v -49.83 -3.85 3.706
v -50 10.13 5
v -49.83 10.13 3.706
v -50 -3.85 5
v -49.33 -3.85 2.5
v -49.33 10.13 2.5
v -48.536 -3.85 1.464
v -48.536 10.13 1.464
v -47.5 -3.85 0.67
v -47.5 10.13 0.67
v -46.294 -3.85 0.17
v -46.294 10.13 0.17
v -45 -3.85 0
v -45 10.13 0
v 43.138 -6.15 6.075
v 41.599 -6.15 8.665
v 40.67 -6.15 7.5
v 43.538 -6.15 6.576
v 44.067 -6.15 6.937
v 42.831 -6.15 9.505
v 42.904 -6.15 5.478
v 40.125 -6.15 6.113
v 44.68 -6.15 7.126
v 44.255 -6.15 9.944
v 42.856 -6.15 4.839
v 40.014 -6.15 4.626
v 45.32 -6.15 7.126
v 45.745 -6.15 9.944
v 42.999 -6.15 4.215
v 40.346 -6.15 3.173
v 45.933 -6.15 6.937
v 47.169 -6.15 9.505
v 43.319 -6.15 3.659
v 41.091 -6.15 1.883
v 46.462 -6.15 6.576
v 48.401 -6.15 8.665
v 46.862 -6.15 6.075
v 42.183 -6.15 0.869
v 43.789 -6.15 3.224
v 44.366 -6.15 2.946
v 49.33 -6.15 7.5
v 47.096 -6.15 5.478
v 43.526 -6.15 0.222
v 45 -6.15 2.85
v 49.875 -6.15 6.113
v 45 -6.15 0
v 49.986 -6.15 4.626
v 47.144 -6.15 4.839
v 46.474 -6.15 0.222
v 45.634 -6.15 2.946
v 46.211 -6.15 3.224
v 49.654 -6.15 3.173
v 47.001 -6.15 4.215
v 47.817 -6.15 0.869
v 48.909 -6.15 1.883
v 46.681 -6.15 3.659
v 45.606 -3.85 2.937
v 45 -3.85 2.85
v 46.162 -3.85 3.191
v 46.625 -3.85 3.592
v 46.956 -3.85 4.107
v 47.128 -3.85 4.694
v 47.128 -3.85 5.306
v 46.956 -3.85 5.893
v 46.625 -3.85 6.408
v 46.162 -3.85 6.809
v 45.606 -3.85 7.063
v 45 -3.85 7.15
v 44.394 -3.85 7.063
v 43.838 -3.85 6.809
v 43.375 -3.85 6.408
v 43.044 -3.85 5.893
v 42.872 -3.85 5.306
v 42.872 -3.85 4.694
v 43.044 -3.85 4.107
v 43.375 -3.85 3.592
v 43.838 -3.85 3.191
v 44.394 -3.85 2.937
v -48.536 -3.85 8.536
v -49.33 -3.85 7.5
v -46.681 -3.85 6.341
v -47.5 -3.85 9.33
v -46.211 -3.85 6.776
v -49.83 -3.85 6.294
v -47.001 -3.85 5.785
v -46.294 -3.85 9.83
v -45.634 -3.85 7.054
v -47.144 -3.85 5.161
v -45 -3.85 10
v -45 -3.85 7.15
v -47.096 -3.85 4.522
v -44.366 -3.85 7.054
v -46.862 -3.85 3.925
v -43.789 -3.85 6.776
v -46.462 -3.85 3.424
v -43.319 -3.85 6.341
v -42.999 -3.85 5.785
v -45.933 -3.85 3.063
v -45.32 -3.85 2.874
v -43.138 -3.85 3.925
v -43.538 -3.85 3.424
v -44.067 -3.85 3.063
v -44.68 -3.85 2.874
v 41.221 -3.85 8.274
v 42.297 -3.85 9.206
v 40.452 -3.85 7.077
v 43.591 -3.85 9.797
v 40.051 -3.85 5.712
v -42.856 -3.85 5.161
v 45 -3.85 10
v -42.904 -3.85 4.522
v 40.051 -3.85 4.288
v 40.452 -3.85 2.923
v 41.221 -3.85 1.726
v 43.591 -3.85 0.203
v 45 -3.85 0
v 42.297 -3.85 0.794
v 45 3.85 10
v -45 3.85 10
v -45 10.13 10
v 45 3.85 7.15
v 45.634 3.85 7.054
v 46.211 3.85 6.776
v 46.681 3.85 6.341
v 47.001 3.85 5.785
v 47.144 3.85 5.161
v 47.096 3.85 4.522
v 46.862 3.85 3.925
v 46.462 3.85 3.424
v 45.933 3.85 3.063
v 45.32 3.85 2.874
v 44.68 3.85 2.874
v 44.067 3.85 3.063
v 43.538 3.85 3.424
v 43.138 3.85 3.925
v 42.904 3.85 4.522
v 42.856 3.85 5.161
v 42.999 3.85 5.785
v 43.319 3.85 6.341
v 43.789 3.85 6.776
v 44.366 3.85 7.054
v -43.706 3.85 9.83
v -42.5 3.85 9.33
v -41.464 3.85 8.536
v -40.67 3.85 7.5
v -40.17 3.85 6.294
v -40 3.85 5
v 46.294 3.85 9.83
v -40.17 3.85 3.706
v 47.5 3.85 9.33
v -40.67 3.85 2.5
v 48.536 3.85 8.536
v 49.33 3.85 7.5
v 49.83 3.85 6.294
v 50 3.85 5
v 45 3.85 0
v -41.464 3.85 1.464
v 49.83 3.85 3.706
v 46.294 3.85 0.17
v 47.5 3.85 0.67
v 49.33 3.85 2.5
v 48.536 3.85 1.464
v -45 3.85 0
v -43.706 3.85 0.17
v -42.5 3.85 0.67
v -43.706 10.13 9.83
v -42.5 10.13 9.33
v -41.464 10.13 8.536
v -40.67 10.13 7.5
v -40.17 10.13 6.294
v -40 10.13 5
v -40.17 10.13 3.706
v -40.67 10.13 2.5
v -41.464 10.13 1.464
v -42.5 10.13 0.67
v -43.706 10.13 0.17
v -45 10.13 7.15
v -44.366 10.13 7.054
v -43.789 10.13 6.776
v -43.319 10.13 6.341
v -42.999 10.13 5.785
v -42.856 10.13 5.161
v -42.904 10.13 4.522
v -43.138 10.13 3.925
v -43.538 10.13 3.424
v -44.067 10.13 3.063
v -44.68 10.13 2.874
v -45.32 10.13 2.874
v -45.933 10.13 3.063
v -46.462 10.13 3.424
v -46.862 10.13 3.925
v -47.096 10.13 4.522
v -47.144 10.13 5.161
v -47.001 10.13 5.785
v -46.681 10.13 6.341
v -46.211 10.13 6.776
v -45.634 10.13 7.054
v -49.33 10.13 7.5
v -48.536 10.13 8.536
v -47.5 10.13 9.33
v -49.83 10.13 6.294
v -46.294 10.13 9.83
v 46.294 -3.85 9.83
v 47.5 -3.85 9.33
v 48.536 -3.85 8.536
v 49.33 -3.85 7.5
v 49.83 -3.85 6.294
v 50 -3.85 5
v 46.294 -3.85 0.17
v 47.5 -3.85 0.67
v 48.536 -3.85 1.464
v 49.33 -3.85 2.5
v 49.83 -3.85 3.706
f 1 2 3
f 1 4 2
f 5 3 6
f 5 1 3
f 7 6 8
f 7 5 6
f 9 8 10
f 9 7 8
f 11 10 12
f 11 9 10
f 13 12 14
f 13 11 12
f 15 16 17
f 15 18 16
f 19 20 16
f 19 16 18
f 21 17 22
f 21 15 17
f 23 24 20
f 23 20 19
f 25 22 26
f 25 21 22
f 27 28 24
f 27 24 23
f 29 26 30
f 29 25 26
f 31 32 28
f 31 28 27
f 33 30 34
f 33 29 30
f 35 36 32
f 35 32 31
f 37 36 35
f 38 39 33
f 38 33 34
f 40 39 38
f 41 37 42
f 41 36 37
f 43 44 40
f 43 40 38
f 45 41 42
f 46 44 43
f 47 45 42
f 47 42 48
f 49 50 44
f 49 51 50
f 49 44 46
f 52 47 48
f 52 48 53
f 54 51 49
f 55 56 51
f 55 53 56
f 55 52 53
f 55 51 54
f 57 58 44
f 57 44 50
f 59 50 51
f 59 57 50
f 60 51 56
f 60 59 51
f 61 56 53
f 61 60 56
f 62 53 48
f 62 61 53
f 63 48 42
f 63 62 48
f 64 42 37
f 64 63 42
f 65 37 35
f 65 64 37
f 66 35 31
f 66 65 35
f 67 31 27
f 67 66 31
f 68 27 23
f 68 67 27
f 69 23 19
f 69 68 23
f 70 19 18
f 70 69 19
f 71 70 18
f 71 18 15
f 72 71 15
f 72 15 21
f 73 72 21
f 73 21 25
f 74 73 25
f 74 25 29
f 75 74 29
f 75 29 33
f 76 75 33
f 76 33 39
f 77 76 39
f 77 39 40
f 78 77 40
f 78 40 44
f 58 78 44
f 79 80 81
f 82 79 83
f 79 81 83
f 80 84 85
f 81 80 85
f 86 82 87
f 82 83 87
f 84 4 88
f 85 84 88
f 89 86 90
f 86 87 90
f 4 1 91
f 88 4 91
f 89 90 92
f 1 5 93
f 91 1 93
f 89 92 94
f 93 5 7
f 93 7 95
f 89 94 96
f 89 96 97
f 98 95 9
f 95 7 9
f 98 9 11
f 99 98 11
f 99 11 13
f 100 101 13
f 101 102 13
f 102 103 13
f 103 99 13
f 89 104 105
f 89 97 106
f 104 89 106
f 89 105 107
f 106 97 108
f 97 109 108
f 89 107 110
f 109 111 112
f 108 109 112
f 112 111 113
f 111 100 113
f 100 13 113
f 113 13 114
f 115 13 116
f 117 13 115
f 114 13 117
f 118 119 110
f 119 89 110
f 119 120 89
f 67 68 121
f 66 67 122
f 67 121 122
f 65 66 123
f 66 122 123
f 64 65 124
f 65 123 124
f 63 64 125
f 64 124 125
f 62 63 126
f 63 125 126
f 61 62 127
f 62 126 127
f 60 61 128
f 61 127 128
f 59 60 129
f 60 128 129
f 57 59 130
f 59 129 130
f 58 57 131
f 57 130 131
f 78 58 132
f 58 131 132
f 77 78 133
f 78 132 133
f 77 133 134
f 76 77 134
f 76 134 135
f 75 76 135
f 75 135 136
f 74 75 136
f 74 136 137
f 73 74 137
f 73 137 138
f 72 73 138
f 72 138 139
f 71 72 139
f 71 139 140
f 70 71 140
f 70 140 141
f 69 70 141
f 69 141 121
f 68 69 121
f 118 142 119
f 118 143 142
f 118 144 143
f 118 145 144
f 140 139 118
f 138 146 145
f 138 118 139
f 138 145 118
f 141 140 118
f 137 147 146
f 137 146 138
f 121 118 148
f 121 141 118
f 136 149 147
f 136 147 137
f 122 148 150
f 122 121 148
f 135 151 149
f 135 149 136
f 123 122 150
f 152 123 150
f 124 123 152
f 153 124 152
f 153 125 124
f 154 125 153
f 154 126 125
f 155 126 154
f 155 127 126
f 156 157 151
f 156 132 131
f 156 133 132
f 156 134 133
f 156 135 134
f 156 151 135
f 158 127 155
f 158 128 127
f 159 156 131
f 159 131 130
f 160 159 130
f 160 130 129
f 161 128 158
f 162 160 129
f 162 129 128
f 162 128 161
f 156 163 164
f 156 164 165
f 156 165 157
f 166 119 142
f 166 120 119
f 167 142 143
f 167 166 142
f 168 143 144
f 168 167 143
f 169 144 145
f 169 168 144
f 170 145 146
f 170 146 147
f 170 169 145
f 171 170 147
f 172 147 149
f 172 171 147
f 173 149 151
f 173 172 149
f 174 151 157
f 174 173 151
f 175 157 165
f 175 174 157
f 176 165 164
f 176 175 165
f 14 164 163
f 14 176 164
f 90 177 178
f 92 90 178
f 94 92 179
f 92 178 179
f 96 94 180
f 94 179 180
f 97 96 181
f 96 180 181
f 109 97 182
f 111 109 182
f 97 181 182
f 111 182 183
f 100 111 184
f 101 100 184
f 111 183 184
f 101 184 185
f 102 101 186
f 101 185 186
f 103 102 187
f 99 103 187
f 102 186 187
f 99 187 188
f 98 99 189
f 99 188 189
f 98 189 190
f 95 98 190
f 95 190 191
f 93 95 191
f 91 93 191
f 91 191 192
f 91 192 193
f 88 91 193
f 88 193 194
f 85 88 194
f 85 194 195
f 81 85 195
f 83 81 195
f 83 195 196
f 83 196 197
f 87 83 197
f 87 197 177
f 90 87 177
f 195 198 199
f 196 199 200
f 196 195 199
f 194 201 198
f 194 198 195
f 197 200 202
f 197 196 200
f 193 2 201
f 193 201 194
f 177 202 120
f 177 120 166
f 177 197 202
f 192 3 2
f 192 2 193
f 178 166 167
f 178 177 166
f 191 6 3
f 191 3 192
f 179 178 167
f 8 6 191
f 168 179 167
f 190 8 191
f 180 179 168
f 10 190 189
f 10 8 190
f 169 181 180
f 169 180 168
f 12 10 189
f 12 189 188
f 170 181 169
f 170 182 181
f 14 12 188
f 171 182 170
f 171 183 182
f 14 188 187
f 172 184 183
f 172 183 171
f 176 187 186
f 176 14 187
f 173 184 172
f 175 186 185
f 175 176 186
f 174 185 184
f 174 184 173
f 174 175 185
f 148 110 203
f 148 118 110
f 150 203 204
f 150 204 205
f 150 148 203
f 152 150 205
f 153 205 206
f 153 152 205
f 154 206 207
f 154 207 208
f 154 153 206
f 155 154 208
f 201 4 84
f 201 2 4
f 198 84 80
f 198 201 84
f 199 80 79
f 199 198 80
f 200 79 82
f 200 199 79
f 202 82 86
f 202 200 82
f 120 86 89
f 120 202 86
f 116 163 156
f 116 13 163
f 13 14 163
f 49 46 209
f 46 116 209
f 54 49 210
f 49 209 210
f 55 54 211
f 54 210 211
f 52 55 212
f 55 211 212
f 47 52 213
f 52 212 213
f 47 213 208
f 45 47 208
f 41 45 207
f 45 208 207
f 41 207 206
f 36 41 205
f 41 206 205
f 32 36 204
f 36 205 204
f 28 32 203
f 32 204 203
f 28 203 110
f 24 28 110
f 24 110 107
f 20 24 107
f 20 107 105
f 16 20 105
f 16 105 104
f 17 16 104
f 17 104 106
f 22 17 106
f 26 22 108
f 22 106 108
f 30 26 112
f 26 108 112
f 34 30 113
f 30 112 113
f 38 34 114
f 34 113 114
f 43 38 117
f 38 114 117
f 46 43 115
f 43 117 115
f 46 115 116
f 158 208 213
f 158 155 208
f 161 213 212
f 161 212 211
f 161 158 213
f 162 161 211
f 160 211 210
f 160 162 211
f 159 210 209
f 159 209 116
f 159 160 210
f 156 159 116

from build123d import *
from build123d.topology import SkipClean

# Parameters (mm, degrees)
SKETCH_1_W          = 100
SKETCH_1_H          = 7.7
EXTRUDE_1_DEPTH     = 10
SKETCH_4_W          = 10
SKETCH_4_H          = 10
EXTRUDE_2_DEPTH     = 6.28
FILLET_1_R          = 5
SKETCH_2_R          = 2.15
CUT_EXTRUDE_1_DEPTH = 53.871924497
SKETCH_5_R          = 5
SKETCH_5_R_2        = 2.15
EXTRUDE_3_DEPTH     = 2.3


with BuildPart() as part:
    # 스케치1 → 보스-돌출1 (new body)
    with BuildSketch(Plane.XY):
        Rectangle(SKETCH_1_W, SKETCH_1_H)
    extrude(amount=EXTRUDE_1_DEPTH)

    # 스케치4 → 보스-돌출2 (add)
    with BuildSketch(Plane(origin=(0, 3.85, 0), x_dir=(1, 0, 0), z_dir=(0, 1, 0))):
        with Locations((-45, -5)):
            Rectangle(SKETCH_4_W, SKETCH_4_H)
    extrude(amount=EXTRUDE_2_DEPTH)

    # 필렛1
    fillet_1_edges = [part.edges().sort_by_distance(p)[0] for p in [
        (50, 0, 0),
        (50, 0, 10),
        (-50, 3.14, 0),
        (-50, 3.14, 10),
        (-40, 6.99, 10),
        (-40, 6.99, 0),
    ]]
    fillet(fillet_1_edges, radius=FILLET_1_R - 0.0001)  # a hair under: the kernel refuses the full size

    # 스케치2 → 컷-돌출1 (cut, through all)
    with BuildSketch(Plane(origin=(0, 10.13, 0), x_dir=(1, 0, 0), z_dir=(0, 1, 0))):
        with Locations(Location((-45, -5, 0), (0, 0, 270))):
            Circle(SKETCH_2_R)
        with Locations(Location((45, -5, 0), (0, 0, 270))):
            Circle(SKETCH_2_R)
    extrude(amount=-CUT_EXTRUDE_1_DEPTH, mode=Mode.SUBTRACT)

    # 스케치5 → 보스-돌출3 (add)
    with SkipClean():  # the faces are left unmerged after this step: merging them gives an invalid solid
        with BuildSketch(Plane.XZ.offset(3.85)):
            with Locations(Location((45, 5, 0), (0, 0, 270))):
                Circle(SKETCH_5_R)
            with Locations(Location((45, 5, 0), (0, 0, 270))):
                Circle(SKETCH_5_R_2, mode=Mode.SUBTRACT)
        extrude(amount=EXTRUDE_3_DEPTH)


solid = part.part
